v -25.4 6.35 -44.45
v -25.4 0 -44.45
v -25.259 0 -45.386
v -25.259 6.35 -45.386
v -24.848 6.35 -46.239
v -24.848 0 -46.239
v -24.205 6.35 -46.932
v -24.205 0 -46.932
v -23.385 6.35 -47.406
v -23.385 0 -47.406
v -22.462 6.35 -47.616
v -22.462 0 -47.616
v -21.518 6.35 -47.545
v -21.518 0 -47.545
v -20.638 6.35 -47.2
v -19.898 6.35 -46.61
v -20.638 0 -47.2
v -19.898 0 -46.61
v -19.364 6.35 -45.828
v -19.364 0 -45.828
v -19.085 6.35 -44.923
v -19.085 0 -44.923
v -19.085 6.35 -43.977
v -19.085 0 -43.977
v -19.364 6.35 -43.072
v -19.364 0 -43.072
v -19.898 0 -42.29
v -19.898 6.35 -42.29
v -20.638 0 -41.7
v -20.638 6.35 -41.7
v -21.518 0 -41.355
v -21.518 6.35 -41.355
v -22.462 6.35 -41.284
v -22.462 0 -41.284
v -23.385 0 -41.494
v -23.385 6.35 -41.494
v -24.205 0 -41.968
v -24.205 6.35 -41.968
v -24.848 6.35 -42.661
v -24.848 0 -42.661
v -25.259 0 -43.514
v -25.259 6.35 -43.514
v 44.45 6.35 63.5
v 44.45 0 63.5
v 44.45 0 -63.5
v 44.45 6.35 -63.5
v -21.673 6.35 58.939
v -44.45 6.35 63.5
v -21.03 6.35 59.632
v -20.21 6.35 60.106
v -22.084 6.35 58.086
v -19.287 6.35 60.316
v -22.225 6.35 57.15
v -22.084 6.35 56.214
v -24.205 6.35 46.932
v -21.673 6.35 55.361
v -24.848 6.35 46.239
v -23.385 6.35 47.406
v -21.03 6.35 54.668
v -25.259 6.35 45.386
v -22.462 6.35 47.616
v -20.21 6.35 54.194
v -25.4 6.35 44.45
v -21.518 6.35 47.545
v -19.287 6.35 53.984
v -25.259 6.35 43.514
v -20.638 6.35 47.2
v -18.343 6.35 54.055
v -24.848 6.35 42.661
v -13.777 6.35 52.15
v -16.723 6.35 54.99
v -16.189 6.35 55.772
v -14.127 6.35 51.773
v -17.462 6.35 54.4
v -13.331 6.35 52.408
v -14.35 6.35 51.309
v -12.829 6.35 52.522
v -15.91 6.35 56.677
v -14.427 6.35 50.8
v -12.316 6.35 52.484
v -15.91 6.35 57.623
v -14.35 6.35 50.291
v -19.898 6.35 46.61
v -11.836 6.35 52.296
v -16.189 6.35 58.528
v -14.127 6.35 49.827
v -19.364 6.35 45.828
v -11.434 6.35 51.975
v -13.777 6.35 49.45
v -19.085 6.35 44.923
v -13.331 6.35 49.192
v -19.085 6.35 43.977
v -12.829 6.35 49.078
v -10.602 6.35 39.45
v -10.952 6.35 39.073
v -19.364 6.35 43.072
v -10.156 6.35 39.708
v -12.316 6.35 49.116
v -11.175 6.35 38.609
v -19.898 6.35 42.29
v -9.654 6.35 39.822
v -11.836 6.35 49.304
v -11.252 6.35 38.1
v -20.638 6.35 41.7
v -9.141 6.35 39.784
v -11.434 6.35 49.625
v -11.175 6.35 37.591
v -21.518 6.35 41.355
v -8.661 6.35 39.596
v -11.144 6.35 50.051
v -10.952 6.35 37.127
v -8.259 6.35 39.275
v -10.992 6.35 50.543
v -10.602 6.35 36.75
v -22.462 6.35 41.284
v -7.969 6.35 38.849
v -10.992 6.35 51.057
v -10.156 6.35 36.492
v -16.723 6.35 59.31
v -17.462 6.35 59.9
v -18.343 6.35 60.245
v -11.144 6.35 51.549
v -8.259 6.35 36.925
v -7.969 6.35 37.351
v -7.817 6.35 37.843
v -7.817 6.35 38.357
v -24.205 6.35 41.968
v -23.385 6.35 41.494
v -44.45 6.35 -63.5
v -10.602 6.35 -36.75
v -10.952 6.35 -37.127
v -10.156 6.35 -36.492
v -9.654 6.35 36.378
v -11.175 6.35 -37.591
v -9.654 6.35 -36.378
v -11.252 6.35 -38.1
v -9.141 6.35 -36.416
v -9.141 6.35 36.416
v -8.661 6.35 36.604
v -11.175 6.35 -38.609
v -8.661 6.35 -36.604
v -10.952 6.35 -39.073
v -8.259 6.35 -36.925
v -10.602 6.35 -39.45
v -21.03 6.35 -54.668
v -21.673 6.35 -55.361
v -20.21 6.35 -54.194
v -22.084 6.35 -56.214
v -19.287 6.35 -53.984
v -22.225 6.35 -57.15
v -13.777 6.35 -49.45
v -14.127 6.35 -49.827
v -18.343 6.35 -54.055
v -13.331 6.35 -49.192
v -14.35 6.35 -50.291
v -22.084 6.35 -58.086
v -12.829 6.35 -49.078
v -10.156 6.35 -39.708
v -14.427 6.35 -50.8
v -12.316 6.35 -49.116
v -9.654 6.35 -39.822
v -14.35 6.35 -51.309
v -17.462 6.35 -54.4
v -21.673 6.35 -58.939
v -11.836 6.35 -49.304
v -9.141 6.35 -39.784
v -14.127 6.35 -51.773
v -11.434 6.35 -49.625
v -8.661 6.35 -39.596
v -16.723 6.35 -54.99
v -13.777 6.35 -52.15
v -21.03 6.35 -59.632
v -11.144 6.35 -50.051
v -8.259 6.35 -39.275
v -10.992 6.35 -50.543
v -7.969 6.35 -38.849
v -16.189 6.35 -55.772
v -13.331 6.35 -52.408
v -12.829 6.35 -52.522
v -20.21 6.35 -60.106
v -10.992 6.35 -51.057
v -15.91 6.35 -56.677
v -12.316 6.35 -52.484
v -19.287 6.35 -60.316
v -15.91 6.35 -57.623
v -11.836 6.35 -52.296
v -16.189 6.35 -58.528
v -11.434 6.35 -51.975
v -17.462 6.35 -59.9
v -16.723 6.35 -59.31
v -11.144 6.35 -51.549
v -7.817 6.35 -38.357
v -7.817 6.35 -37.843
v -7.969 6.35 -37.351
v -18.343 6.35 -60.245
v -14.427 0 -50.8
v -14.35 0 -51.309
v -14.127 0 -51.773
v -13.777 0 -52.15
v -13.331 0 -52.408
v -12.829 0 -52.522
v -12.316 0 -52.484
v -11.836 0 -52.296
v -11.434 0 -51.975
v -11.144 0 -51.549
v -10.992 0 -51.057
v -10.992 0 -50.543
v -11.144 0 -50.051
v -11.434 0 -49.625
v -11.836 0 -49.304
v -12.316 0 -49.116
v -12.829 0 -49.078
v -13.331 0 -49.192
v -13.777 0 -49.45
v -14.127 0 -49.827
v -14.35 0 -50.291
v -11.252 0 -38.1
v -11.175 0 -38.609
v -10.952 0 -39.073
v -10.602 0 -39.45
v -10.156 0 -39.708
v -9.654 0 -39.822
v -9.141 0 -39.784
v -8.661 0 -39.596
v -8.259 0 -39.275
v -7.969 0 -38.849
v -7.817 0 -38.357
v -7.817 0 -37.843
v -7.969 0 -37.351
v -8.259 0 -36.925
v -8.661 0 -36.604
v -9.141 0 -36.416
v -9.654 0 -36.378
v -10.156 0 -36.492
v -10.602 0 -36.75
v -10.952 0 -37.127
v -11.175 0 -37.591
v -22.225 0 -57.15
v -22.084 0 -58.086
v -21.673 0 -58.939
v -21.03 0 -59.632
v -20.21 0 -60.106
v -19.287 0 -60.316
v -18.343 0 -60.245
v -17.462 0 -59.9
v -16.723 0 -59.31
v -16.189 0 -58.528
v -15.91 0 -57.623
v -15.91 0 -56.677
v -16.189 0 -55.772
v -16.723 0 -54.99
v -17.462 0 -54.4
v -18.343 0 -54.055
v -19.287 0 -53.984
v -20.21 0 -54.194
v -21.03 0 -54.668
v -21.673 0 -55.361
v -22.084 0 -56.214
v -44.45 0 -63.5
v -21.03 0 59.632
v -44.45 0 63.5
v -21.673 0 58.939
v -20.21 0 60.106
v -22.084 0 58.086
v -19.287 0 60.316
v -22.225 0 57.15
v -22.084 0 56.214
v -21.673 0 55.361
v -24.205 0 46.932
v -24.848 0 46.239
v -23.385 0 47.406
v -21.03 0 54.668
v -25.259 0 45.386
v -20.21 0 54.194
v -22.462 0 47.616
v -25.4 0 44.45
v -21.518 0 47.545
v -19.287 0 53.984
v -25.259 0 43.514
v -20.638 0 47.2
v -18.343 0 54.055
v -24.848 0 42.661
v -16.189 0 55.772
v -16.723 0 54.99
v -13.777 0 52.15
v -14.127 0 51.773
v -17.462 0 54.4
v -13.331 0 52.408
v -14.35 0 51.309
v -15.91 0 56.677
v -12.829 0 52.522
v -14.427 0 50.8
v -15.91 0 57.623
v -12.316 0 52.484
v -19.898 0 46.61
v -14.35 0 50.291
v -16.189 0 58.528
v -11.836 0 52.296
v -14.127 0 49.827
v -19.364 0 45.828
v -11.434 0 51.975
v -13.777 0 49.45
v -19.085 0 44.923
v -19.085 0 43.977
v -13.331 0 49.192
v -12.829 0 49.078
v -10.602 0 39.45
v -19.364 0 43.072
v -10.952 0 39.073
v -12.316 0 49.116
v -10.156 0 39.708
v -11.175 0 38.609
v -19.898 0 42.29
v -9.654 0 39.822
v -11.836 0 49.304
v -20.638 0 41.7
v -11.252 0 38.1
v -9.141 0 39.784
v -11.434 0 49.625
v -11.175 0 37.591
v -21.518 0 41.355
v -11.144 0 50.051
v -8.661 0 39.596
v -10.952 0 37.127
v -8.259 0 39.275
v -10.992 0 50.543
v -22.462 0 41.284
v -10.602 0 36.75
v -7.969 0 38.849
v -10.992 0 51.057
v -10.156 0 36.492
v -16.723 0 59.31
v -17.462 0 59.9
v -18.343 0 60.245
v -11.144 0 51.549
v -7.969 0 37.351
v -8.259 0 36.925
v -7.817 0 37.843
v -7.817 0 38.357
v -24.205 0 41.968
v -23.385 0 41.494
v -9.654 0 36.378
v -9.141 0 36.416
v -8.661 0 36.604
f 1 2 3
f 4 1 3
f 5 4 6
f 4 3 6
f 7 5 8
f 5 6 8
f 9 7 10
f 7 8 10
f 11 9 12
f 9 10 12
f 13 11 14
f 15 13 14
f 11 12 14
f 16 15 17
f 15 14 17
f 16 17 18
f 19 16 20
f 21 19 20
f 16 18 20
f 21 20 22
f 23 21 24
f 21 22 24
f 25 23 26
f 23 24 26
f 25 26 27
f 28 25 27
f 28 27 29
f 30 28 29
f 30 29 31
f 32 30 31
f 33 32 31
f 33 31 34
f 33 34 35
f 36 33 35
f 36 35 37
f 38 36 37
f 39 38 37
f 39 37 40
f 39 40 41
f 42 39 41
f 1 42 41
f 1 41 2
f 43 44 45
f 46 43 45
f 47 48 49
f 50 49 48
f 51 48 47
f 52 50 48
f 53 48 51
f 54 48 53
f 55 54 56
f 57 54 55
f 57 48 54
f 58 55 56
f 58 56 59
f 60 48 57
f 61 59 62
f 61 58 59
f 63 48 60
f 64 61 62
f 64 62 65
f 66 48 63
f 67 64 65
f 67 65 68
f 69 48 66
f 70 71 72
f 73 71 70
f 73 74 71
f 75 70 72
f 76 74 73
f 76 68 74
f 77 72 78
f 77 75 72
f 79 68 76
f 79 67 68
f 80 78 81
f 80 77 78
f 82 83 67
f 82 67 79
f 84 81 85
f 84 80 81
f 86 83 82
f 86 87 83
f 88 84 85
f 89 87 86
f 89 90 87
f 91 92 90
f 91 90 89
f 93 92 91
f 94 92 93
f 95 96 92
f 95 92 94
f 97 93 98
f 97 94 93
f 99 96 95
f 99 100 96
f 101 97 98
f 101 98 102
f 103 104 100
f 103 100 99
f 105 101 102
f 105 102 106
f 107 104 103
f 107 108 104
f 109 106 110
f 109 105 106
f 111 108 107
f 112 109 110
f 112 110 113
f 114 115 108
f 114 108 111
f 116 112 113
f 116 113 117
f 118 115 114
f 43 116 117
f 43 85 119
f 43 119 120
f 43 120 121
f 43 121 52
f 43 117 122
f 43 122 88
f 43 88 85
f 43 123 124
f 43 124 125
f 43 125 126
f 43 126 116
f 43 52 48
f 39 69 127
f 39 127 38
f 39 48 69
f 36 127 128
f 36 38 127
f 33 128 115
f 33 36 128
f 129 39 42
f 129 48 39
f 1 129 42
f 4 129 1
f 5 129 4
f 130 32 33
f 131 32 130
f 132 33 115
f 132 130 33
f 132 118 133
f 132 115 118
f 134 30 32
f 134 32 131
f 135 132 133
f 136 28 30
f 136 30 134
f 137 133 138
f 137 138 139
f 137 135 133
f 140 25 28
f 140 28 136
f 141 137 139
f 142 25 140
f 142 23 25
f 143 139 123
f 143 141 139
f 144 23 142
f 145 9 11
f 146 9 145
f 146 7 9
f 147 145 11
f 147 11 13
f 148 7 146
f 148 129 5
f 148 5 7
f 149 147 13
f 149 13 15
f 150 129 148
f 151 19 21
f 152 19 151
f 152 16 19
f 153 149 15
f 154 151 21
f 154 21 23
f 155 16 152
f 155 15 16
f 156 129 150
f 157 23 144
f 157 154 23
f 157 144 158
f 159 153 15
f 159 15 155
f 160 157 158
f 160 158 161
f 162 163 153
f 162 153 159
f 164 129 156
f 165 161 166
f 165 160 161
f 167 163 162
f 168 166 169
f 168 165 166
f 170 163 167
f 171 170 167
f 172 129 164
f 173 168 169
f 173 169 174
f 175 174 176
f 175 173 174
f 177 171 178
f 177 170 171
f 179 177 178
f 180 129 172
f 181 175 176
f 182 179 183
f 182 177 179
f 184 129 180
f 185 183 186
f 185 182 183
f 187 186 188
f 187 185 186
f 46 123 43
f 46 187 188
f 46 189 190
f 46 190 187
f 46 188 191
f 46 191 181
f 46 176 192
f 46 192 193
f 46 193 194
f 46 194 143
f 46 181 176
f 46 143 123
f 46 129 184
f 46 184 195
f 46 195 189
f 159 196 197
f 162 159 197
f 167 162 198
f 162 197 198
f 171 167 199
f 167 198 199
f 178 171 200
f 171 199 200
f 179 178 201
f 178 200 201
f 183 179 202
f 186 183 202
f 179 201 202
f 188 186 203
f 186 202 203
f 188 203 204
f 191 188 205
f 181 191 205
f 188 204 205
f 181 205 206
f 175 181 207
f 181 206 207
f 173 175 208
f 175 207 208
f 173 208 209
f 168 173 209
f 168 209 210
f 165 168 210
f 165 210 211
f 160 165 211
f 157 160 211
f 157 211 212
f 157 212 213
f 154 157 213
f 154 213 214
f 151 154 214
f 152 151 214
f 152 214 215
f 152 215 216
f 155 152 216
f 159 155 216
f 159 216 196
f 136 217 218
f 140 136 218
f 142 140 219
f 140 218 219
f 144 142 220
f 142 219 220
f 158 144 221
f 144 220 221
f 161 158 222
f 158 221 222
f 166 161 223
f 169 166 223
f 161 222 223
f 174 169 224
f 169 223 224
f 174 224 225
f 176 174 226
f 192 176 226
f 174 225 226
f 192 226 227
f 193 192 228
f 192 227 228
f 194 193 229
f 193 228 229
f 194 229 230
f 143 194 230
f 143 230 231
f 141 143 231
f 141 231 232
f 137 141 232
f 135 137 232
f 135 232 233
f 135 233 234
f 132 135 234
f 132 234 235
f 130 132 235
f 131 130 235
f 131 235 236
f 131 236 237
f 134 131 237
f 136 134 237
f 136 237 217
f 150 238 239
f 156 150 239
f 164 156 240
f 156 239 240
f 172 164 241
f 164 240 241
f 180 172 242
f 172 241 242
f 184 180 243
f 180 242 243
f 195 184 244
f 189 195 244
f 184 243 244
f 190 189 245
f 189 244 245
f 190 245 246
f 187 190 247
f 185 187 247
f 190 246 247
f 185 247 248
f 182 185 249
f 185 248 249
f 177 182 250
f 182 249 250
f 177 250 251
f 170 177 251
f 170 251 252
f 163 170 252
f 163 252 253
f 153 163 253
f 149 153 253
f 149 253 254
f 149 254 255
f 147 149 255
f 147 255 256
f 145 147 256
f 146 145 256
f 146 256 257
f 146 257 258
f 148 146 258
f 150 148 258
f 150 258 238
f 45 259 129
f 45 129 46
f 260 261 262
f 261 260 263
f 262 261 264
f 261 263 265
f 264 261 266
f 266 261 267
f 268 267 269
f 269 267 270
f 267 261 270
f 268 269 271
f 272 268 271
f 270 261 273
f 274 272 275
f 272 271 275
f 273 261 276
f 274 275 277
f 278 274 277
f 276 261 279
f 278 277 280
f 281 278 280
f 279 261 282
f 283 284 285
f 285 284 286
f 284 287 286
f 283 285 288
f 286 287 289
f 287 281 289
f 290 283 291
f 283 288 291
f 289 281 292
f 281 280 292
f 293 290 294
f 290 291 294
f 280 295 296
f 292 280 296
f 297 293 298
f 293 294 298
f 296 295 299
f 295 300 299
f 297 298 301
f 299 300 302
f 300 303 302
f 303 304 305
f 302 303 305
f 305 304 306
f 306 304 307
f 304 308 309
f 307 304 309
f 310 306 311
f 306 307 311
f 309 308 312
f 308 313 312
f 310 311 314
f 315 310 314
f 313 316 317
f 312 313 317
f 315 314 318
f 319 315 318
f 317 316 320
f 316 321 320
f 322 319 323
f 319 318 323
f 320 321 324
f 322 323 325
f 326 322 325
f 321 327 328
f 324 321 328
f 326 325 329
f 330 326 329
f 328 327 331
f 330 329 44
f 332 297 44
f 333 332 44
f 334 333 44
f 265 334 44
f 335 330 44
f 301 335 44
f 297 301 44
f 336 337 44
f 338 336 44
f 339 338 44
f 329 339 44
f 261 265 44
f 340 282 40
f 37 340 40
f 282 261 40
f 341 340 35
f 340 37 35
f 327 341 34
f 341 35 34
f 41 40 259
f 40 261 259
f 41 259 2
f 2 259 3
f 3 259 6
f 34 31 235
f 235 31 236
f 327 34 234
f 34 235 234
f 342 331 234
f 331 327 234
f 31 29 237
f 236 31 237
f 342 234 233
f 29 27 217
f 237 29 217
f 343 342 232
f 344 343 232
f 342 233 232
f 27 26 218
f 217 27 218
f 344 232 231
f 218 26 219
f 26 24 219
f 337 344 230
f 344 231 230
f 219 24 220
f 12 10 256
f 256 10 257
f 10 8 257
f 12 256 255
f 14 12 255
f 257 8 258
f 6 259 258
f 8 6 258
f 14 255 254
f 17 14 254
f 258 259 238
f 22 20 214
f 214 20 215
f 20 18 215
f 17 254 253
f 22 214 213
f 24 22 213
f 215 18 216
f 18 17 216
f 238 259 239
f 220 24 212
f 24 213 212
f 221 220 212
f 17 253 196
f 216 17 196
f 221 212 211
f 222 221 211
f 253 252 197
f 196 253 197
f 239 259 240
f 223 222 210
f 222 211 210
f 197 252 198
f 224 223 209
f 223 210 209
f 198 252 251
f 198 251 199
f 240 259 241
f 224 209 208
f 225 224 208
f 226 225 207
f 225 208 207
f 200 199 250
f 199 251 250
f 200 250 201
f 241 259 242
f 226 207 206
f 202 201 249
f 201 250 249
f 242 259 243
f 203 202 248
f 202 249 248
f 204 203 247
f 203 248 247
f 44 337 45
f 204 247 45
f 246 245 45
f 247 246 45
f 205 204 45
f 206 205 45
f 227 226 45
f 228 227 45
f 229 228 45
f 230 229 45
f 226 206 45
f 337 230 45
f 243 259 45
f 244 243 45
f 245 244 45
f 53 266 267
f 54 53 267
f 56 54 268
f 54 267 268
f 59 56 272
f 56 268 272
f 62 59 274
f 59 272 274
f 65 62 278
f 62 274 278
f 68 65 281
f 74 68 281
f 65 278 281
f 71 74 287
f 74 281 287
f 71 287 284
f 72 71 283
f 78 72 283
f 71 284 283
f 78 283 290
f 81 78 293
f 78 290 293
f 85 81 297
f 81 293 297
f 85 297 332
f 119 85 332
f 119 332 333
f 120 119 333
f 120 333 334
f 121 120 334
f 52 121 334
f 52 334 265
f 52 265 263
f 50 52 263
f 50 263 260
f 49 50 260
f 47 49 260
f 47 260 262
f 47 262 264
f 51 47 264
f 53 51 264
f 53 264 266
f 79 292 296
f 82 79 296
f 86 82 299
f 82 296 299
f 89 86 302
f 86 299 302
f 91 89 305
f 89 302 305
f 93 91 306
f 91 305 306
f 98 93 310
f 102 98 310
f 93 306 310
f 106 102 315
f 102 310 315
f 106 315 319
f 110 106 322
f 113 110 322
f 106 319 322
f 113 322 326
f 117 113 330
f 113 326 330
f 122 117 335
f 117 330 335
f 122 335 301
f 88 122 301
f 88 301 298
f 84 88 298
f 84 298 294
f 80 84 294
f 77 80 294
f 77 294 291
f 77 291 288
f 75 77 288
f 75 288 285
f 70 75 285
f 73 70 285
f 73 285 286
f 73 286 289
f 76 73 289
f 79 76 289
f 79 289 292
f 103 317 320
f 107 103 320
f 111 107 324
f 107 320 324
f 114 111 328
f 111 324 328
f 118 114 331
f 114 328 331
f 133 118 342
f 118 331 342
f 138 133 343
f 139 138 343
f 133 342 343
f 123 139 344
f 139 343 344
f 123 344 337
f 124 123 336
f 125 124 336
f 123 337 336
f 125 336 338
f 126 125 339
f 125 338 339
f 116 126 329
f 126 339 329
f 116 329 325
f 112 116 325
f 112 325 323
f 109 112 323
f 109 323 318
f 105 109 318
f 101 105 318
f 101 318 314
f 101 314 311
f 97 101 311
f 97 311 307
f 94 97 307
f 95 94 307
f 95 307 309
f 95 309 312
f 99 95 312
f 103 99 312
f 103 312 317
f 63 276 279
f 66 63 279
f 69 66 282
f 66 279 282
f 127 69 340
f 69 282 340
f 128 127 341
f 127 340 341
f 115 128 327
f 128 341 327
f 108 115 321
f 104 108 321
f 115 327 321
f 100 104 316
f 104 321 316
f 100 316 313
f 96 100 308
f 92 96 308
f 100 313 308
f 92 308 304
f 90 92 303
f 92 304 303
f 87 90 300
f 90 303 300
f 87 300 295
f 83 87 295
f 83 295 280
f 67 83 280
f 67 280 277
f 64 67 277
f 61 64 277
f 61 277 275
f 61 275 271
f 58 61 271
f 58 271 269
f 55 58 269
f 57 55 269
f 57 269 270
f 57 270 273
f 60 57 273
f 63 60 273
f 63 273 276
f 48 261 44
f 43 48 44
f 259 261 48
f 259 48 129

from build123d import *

# Parameters (mm, degrees)
SKETCH1_W                  = 88.9
SKETCH1_H                  = 127
BOSS_EXTRUDE1_DEPTH        = 6.35
F_1_4_0_2500_DOWEL_HOLE1_D = 6.35
F_8_32_TAPPED_HOLE1_D      = 3.4544
F_1_4_0_2500_DOWEL_HOLE2_D = 6.35
F_8_32_TAPPED_HOLE2_D      = 3.4544


with BuildPart() as part:
    # Sketch1 → Boss-Extrude1 (new body)
    with BuildSketch(Plane(origin=(0, 0, 0), x_dir=(1, 0, 0), z_dir=(0, 1, 0))):
        Rectangle(SKETCH1_W, SKETCH1_H)
    extrude(amount=BOSS_EXTRUDE1_DEPTH)

    # 1/4 (0.2500) Dowel Hole1 (through all)
    with Locations(Plane(origin=(0, 6.35, 0), x_dir=(1, 0, 0), z_dir=(0, 1, 0))):
        with Locations((-22.225, -44.45), (-22.225, 44.45)):
            Hole(F_1_4_0_2500_DOWEL_HOLE1_D / 2)

    # #8-32 Tapped Hole1 (through all)
    with Locations(Plane(origin=(0, 6.35, 0), x_dir=(1, 0, 0), z_dir=(0, 1, 0))):
        with Locations((-9.525, -38.1), (-9.525, 38.1)):
            Hole(F_8_32_TAPPED_HOLE1_D / 2)

    # 1/4 (0.2500) Dowel Hole2 (through all)
    with Locations(Plane(origin=(0, 6.35, 0), x_dir=(1, 0, 0), z_dir=(0, 1, 0))):
        with Locations((-19.05, 57.15), (-19.05, -57.15)):
            Hole(F_1_4_0_2500_DOWEL_HOLE2_D / 2)

    # #8-32 Tapped Hole2 (through all)
    with Locations(Plane(origin=(0, 6.35, 0), x_dir=(1, 0, 0), z_dir=(0, 1, 0))):
        with Locations((-12.7, 50.8), (-12.7, -50.8)):
            Hole(F_8_32_TAPPED_HOLE2_D / 2)


solid = part.part
